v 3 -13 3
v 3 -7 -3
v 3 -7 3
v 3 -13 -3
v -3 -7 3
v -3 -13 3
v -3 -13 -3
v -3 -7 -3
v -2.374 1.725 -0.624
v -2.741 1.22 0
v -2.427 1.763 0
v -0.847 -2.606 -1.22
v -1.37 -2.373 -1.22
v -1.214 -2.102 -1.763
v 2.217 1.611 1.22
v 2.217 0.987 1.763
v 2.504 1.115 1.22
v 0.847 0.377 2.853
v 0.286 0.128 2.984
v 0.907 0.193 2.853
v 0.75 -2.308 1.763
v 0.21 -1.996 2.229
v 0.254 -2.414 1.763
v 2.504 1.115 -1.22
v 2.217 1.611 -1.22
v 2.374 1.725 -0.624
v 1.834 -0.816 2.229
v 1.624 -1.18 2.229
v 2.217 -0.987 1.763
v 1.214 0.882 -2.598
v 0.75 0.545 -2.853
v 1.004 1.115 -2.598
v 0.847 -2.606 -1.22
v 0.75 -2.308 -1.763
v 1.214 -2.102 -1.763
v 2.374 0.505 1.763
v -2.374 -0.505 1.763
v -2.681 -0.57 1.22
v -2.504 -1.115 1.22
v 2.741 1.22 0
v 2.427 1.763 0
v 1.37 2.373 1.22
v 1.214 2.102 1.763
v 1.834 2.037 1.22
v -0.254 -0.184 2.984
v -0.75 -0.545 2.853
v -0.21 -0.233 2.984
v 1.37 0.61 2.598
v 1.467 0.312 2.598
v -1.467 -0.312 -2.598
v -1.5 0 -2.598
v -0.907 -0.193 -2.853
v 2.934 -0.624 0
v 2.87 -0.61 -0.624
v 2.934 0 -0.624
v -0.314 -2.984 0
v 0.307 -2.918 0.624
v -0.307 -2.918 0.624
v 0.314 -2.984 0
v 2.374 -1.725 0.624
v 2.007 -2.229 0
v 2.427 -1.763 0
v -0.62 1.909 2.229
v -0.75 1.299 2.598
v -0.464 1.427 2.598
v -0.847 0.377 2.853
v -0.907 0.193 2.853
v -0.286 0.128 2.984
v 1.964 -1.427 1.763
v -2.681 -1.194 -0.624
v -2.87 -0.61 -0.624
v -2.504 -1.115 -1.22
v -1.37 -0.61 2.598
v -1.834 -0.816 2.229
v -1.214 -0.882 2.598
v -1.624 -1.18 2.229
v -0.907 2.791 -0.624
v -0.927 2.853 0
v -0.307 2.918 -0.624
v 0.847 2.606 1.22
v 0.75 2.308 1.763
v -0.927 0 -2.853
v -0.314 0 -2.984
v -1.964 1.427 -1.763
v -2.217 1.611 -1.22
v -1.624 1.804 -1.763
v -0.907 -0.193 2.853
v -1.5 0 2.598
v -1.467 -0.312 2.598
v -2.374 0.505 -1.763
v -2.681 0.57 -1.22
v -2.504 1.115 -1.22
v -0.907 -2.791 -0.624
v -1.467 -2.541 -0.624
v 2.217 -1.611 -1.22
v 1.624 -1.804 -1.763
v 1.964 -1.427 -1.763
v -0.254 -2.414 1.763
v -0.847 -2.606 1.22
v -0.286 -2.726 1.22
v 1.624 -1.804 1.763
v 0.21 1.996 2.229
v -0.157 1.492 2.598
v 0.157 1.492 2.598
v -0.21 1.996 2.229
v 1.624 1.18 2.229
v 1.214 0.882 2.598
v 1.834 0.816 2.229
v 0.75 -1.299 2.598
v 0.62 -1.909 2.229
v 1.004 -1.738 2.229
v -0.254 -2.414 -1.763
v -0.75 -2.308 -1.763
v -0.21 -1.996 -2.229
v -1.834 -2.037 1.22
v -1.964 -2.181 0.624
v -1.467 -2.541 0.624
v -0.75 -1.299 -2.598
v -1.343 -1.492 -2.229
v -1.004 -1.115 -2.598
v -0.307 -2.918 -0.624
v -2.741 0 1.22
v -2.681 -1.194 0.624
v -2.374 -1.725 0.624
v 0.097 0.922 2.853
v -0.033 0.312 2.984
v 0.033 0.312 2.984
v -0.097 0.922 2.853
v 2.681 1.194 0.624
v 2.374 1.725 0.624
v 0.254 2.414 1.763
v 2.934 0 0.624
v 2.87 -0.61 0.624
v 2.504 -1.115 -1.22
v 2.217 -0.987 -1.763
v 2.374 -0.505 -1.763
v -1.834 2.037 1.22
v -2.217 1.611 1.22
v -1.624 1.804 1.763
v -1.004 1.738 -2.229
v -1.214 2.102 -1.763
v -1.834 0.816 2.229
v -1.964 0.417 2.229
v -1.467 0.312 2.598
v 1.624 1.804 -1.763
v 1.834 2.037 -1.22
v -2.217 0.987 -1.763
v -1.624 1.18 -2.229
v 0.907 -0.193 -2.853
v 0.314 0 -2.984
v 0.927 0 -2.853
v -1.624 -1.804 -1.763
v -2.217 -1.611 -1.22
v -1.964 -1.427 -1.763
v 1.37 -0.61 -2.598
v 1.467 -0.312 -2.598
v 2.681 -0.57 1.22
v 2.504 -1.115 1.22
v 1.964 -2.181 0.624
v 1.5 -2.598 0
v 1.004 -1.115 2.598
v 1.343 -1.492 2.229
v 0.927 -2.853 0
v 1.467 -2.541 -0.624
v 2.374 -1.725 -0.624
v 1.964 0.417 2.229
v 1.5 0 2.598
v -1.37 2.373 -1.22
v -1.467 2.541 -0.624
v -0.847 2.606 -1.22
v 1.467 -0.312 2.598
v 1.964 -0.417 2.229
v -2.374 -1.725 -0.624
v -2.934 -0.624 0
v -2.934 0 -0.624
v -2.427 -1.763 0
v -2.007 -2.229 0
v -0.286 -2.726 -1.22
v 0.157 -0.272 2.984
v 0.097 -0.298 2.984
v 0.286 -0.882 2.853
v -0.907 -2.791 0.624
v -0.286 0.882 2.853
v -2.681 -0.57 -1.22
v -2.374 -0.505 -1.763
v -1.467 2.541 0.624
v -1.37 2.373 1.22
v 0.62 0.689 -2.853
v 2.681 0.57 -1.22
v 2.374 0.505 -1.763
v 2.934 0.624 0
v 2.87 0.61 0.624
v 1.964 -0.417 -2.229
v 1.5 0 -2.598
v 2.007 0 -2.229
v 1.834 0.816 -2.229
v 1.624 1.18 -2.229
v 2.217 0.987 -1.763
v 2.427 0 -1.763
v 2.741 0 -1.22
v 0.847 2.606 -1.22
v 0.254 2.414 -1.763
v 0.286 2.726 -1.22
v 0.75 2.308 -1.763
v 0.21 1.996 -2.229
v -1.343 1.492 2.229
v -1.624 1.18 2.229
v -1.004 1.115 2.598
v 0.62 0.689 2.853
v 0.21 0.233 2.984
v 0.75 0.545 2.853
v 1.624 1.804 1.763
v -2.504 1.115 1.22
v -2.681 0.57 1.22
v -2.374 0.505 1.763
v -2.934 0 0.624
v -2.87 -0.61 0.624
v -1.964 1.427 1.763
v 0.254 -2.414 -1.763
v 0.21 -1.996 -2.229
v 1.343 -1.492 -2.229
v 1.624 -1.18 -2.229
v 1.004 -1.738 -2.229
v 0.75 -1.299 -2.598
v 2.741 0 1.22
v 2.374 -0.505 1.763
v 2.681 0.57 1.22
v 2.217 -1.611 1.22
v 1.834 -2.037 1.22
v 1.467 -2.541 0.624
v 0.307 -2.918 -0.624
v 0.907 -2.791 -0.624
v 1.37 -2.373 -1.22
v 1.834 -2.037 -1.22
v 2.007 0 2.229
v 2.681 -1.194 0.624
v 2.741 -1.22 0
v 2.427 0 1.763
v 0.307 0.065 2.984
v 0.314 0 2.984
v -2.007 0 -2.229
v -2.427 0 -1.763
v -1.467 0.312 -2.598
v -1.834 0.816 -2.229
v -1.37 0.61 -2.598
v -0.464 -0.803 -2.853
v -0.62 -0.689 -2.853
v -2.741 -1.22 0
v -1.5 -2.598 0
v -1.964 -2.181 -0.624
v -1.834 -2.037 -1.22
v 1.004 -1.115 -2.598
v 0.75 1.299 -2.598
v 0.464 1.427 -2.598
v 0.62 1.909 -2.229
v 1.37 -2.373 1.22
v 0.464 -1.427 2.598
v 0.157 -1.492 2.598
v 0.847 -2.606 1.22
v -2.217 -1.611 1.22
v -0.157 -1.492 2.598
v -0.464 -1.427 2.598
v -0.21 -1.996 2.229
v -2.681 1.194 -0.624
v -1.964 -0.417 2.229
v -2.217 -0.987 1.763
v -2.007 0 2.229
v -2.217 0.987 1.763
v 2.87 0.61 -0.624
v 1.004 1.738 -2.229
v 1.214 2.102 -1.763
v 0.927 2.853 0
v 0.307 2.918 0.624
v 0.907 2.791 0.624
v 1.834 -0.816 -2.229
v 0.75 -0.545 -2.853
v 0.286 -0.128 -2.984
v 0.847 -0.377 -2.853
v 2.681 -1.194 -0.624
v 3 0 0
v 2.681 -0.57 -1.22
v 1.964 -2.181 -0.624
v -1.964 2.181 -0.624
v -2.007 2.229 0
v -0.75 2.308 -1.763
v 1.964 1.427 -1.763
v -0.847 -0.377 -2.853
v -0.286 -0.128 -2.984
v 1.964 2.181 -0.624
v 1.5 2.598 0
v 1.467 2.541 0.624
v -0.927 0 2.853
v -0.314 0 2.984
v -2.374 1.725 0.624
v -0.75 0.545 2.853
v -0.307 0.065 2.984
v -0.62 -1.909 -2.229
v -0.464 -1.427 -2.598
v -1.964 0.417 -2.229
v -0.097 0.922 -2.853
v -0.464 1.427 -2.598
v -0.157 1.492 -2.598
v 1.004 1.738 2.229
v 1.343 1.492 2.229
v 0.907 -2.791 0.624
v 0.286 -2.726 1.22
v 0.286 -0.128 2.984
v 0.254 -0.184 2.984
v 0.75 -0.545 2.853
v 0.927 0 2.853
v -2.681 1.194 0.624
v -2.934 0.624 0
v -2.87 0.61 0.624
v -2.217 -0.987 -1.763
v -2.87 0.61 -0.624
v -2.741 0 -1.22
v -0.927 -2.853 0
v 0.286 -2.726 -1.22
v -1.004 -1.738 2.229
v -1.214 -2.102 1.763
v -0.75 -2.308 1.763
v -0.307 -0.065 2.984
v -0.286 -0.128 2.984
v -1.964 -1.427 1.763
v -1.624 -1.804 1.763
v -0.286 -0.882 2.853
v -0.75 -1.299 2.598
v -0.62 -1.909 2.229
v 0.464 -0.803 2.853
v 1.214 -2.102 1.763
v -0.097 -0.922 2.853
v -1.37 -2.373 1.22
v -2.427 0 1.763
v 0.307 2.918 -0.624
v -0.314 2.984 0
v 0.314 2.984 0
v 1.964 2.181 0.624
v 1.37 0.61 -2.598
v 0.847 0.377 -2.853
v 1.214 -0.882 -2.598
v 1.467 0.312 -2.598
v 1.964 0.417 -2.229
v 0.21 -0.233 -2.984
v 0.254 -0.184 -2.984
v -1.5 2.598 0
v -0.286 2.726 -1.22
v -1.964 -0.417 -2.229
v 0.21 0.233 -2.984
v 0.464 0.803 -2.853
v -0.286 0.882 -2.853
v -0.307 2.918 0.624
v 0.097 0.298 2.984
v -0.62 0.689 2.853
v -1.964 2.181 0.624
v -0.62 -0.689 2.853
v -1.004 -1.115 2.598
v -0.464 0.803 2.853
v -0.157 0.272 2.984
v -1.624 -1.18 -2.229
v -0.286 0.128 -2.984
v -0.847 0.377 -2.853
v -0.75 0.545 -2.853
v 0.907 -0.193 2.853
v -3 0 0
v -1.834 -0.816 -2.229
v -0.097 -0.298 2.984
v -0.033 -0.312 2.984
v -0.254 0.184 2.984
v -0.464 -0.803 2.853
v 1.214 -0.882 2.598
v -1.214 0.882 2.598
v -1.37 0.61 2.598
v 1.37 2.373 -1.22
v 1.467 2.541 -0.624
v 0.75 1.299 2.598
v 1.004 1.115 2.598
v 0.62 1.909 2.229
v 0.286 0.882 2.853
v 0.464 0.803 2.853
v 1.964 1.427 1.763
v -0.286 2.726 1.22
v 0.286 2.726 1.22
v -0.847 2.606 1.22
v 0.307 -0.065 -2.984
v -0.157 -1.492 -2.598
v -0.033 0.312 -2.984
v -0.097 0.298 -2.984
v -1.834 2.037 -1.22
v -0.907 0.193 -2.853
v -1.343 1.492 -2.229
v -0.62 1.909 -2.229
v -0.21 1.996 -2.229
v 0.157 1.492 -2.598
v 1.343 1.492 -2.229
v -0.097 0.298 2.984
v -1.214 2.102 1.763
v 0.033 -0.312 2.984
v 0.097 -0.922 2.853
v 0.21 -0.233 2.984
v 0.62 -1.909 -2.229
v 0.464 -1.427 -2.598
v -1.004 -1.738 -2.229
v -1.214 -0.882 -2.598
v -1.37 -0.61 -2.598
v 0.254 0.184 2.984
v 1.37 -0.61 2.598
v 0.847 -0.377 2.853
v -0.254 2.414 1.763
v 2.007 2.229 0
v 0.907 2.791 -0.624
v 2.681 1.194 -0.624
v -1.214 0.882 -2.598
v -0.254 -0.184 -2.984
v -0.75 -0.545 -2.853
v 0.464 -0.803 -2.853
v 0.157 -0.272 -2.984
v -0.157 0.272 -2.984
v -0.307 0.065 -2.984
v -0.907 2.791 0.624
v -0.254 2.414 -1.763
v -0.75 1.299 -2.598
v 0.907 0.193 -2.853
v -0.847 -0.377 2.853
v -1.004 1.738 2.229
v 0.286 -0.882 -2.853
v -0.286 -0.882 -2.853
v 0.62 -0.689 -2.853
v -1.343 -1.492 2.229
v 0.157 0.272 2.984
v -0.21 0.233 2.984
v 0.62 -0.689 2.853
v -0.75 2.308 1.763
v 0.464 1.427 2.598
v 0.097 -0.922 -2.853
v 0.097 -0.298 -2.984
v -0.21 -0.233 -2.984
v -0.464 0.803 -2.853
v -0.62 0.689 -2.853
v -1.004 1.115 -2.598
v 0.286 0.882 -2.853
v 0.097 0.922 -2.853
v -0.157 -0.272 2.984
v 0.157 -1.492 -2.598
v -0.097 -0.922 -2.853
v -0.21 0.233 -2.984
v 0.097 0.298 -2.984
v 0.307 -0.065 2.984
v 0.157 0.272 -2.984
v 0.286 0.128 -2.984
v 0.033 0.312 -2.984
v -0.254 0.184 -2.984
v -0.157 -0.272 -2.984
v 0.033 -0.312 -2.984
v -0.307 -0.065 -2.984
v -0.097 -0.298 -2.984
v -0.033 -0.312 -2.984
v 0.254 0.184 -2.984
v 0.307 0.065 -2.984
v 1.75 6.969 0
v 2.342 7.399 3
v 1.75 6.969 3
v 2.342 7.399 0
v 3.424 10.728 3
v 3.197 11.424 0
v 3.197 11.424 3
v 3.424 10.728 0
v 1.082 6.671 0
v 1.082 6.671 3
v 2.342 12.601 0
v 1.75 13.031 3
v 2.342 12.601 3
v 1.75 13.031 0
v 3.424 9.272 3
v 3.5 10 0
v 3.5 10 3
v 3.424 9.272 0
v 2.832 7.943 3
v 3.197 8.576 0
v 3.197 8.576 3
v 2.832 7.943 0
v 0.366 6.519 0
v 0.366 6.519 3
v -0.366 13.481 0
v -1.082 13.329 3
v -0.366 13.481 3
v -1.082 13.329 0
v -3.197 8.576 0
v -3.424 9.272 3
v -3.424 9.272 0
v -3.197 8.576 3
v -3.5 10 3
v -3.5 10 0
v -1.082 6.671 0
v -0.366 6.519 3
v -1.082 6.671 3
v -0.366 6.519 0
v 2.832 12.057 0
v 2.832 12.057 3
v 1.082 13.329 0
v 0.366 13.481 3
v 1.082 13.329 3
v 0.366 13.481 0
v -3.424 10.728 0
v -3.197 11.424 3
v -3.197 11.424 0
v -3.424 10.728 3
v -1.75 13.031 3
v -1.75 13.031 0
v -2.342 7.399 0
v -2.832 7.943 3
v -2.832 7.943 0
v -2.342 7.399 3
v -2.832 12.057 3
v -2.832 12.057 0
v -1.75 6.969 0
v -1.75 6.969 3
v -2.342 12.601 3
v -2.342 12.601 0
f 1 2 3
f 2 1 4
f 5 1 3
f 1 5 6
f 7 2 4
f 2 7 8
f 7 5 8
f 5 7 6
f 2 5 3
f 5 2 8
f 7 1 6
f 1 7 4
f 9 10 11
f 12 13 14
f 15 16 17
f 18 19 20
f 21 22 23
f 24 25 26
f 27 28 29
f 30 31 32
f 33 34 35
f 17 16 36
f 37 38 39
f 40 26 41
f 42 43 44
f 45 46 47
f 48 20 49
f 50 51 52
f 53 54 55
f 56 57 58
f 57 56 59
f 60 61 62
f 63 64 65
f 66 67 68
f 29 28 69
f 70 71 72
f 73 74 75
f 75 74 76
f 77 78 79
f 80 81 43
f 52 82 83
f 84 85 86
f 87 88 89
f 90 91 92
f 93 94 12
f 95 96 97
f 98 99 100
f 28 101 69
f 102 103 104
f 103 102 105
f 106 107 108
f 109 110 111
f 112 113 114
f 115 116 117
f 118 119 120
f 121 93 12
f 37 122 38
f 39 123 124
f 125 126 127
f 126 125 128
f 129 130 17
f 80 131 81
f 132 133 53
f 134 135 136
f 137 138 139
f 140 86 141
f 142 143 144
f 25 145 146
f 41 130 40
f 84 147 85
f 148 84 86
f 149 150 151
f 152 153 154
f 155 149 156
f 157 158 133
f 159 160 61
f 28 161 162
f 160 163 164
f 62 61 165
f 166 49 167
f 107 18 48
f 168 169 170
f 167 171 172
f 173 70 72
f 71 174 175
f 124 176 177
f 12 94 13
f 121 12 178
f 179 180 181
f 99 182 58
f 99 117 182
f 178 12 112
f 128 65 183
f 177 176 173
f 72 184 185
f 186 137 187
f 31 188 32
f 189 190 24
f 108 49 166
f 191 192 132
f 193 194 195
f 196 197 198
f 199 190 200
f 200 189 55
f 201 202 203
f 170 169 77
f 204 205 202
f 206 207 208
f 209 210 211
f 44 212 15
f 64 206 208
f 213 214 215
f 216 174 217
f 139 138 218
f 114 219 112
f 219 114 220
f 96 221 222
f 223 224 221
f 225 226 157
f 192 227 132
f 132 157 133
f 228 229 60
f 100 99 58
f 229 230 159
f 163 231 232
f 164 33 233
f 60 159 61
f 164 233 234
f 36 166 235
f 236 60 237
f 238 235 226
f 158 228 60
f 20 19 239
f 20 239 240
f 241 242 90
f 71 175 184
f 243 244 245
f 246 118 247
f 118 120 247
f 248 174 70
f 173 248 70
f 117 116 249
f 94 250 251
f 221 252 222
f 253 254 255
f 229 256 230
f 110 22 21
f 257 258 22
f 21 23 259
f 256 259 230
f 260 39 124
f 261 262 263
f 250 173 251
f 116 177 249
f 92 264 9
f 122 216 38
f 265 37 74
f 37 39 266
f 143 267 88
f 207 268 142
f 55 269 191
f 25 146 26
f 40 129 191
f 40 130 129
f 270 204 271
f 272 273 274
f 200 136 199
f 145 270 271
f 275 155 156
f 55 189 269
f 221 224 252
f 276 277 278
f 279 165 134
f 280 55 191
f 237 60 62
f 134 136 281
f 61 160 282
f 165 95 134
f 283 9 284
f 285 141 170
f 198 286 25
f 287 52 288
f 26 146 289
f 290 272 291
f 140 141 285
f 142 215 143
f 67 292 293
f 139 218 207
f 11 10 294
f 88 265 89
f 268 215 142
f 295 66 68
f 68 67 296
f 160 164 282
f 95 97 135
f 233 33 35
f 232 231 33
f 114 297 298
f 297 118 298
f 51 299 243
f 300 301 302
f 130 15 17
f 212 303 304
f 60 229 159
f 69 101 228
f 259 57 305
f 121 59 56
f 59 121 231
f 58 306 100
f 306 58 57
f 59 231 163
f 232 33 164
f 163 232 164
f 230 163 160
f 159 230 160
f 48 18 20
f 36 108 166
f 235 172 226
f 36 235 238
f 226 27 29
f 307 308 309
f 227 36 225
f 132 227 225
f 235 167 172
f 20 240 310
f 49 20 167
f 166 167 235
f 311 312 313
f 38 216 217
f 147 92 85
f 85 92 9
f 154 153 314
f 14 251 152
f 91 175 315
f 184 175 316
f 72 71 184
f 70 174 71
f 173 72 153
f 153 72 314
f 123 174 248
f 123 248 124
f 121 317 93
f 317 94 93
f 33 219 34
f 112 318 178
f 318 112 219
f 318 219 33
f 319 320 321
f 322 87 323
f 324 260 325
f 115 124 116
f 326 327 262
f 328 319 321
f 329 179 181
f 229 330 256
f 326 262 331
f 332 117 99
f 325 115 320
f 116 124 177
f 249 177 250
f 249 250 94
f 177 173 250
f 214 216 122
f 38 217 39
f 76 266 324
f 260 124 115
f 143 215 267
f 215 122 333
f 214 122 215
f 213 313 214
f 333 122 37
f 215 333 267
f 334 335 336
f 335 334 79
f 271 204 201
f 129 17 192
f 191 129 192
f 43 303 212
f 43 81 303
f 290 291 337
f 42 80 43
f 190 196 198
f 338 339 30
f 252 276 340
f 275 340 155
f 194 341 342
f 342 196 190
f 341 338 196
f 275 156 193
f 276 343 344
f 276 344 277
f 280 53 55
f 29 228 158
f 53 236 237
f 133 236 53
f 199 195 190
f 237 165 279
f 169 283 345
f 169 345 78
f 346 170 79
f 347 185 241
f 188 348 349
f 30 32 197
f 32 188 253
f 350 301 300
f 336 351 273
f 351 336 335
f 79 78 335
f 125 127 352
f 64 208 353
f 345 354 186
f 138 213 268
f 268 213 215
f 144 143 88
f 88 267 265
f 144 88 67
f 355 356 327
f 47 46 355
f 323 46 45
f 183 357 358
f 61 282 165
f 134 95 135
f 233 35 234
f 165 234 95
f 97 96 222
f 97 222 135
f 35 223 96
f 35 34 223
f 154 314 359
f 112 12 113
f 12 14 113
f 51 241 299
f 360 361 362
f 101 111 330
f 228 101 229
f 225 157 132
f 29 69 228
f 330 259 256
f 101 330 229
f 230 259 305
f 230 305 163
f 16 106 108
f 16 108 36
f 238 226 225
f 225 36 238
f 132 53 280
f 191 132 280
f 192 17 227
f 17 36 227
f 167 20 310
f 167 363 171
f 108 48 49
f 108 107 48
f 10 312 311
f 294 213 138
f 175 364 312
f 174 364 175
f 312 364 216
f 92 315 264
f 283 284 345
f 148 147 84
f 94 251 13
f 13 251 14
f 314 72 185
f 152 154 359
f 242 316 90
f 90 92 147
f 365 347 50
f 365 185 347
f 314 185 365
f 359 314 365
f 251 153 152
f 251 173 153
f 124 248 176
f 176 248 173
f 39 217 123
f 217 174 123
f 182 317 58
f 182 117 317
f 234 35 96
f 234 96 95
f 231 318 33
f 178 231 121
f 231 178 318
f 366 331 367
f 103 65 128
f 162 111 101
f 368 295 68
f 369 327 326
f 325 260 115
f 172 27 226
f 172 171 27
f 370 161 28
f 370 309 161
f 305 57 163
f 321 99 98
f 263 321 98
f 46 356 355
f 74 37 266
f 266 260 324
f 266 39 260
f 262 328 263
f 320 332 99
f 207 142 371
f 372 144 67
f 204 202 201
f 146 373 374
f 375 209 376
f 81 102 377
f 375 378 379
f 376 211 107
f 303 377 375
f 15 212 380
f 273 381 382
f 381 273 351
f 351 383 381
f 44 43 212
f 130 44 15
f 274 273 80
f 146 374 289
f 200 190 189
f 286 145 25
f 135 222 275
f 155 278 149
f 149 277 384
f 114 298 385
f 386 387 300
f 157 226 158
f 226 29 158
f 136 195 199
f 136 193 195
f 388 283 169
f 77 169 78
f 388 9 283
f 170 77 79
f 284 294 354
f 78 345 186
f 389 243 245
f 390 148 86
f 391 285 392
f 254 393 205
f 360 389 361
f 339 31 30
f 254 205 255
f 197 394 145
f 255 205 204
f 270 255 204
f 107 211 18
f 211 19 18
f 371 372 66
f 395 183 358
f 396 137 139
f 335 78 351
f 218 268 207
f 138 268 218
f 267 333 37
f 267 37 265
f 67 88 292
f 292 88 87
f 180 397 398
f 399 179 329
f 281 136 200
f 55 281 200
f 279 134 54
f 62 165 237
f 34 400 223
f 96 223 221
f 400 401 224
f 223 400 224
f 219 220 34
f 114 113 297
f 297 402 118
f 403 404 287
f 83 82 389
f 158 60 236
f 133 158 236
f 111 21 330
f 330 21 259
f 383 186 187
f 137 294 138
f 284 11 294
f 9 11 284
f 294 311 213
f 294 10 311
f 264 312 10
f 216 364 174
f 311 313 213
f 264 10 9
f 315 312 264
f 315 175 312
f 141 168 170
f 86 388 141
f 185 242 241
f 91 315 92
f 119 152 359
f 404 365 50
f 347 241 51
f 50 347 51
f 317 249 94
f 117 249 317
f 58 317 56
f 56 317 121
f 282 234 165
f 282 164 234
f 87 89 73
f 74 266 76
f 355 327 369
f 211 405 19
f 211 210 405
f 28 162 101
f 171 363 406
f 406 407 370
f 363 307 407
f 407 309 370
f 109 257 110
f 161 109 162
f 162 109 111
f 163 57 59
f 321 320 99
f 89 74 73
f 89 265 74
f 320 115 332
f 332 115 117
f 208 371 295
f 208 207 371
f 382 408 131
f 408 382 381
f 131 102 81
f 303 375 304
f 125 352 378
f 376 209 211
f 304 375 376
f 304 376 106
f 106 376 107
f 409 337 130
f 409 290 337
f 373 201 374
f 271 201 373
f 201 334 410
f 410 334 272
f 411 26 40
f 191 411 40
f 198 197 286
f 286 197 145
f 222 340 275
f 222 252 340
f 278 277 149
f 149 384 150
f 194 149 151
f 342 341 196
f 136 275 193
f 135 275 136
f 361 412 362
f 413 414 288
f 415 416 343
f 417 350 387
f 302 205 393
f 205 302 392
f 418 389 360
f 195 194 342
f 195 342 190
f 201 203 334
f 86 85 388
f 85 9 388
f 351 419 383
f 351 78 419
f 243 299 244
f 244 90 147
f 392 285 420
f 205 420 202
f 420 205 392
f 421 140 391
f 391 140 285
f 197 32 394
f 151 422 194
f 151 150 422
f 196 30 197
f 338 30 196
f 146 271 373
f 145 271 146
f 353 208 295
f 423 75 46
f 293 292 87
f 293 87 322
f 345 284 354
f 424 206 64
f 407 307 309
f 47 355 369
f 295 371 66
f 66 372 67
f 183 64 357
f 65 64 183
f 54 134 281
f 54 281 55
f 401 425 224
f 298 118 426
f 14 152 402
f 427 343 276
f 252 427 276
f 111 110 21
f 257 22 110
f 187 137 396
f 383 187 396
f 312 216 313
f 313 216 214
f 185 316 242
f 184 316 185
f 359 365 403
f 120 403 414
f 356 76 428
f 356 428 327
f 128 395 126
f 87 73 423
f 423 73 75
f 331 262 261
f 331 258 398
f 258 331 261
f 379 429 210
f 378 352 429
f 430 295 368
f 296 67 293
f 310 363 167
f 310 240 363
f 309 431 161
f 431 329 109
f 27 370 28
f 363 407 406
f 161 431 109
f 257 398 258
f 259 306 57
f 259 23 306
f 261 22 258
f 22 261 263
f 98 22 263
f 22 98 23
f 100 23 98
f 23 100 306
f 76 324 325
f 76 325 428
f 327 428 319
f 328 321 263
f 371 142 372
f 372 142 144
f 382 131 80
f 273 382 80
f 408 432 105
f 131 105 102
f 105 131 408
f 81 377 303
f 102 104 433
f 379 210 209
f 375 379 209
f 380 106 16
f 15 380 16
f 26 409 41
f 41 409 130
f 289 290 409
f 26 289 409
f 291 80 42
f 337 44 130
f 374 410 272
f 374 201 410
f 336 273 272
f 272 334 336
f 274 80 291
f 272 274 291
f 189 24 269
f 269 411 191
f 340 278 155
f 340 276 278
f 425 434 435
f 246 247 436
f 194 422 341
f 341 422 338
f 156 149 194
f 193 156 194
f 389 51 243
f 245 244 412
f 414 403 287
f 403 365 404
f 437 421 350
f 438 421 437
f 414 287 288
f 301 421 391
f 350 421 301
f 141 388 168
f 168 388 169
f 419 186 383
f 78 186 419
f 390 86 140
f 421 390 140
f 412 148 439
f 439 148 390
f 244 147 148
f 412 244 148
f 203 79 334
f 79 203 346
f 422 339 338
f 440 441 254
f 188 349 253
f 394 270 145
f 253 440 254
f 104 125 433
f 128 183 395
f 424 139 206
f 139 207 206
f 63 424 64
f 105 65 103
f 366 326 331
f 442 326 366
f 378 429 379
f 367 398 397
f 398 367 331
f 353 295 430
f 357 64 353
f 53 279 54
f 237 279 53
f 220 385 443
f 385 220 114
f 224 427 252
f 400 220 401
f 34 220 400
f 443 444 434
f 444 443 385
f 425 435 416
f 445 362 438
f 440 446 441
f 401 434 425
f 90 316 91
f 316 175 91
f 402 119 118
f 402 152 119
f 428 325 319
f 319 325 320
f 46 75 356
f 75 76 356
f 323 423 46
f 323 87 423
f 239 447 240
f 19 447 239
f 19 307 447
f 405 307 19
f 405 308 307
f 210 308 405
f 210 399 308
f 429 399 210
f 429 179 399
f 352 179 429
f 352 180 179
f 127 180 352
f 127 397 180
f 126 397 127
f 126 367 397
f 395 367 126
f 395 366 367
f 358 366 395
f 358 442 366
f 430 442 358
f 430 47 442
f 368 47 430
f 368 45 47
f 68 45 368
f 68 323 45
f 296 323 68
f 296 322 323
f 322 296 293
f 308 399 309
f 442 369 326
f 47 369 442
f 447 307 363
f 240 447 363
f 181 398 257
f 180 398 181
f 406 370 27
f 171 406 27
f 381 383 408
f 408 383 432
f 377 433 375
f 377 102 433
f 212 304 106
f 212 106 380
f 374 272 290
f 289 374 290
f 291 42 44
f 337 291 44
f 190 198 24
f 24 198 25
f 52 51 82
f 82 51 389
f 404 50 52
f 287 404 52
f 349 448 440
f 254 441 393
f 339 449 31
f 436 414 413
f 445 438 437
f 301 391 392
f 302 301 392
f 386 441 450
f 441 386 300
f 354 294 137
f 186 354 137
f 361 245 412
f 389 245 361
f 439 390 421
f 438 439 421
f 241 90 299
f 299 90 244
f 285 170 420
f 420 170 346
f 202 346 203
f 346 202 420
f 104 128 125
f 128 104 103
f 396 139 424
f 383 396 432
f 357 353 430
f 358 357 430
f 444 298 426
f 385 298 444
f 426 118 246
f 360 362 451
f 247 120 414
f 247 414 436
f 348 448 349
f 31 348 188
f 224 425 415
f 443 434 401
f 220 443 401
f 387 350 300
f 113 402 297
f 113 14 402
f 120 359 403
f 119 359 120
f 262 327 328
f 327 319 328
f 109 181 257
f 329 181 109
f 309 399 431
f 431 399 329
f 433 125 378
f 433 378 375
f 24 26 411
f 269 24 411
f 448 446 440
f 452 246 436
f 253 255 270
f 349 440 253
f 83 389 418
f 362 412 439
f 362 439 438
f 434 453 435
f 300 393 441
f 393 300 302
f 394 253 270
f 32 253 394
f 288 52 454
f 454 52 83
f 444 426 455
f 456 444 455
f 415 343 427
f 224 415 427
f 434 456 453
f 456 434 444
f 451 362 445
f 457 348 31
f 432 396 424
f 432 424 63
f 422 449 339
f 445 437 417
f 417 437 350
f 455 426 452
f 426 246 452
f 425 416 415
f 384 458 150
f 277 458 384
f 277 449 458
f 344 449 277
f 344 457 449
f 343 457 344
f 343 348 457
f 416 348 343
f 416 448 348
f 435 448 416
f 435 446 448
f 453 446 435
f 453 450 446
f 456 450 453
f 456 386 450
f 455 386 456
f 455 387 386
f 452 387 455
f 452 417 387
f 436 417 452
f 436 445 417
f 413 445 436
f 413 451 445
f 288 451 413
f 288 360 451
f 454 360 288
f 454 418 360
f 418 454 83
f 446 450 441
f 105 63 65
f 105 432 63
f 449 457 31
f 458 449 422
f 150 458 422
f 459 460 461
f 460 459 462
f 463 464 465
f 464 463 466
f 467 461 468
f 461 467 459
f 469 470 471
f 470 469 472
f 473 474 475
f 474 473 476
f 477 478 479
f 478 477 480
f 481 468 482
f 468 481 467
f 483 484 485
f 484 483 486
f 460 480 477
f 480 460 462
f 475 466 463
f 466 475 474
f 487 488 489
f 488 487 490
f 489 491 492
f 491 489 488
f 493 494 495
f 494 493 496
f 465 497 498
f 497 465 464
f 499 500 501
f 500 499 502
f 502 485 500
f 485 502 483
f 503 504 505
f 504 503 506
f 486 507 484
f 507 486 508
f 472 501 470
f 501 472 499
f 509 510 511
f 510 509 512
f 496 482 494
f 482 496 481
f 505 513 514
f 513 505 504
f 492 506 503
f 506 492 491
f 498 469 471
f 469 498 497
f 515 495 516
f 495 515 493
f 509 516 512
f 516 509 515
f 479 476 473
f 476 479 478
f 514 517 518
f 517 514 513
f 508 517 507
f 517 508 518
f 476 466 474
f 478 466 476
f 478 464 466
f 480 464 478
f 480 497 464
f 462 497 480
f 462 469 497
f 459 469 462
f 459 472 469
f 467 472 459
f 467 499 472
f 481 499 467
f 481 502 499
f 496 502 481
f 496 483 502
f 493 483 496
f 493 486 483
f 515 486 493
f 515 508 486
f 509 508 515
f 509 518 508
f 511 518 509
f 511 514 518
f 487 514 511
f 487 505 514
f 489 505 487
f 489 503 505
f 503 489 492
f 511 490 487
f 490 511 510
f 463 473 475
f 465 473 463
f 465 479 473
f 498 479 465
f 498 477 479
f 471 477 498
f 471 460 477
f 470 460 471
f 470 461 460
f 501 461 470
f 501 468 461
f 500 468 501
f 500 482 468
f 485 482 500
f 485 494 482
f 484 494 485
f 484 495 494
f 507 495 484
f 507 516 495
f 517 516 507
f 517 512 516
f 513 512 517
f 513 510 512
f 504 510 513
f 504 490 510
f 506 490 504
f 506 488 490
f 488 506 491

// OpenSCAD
$fn = 30;

translate([0,-10,0]) {
    cube([6, 6, 6], center=true);
}

sphere(3);

translate([0,10,0]) {
    cylinder(h=3, r=3.5);
}
